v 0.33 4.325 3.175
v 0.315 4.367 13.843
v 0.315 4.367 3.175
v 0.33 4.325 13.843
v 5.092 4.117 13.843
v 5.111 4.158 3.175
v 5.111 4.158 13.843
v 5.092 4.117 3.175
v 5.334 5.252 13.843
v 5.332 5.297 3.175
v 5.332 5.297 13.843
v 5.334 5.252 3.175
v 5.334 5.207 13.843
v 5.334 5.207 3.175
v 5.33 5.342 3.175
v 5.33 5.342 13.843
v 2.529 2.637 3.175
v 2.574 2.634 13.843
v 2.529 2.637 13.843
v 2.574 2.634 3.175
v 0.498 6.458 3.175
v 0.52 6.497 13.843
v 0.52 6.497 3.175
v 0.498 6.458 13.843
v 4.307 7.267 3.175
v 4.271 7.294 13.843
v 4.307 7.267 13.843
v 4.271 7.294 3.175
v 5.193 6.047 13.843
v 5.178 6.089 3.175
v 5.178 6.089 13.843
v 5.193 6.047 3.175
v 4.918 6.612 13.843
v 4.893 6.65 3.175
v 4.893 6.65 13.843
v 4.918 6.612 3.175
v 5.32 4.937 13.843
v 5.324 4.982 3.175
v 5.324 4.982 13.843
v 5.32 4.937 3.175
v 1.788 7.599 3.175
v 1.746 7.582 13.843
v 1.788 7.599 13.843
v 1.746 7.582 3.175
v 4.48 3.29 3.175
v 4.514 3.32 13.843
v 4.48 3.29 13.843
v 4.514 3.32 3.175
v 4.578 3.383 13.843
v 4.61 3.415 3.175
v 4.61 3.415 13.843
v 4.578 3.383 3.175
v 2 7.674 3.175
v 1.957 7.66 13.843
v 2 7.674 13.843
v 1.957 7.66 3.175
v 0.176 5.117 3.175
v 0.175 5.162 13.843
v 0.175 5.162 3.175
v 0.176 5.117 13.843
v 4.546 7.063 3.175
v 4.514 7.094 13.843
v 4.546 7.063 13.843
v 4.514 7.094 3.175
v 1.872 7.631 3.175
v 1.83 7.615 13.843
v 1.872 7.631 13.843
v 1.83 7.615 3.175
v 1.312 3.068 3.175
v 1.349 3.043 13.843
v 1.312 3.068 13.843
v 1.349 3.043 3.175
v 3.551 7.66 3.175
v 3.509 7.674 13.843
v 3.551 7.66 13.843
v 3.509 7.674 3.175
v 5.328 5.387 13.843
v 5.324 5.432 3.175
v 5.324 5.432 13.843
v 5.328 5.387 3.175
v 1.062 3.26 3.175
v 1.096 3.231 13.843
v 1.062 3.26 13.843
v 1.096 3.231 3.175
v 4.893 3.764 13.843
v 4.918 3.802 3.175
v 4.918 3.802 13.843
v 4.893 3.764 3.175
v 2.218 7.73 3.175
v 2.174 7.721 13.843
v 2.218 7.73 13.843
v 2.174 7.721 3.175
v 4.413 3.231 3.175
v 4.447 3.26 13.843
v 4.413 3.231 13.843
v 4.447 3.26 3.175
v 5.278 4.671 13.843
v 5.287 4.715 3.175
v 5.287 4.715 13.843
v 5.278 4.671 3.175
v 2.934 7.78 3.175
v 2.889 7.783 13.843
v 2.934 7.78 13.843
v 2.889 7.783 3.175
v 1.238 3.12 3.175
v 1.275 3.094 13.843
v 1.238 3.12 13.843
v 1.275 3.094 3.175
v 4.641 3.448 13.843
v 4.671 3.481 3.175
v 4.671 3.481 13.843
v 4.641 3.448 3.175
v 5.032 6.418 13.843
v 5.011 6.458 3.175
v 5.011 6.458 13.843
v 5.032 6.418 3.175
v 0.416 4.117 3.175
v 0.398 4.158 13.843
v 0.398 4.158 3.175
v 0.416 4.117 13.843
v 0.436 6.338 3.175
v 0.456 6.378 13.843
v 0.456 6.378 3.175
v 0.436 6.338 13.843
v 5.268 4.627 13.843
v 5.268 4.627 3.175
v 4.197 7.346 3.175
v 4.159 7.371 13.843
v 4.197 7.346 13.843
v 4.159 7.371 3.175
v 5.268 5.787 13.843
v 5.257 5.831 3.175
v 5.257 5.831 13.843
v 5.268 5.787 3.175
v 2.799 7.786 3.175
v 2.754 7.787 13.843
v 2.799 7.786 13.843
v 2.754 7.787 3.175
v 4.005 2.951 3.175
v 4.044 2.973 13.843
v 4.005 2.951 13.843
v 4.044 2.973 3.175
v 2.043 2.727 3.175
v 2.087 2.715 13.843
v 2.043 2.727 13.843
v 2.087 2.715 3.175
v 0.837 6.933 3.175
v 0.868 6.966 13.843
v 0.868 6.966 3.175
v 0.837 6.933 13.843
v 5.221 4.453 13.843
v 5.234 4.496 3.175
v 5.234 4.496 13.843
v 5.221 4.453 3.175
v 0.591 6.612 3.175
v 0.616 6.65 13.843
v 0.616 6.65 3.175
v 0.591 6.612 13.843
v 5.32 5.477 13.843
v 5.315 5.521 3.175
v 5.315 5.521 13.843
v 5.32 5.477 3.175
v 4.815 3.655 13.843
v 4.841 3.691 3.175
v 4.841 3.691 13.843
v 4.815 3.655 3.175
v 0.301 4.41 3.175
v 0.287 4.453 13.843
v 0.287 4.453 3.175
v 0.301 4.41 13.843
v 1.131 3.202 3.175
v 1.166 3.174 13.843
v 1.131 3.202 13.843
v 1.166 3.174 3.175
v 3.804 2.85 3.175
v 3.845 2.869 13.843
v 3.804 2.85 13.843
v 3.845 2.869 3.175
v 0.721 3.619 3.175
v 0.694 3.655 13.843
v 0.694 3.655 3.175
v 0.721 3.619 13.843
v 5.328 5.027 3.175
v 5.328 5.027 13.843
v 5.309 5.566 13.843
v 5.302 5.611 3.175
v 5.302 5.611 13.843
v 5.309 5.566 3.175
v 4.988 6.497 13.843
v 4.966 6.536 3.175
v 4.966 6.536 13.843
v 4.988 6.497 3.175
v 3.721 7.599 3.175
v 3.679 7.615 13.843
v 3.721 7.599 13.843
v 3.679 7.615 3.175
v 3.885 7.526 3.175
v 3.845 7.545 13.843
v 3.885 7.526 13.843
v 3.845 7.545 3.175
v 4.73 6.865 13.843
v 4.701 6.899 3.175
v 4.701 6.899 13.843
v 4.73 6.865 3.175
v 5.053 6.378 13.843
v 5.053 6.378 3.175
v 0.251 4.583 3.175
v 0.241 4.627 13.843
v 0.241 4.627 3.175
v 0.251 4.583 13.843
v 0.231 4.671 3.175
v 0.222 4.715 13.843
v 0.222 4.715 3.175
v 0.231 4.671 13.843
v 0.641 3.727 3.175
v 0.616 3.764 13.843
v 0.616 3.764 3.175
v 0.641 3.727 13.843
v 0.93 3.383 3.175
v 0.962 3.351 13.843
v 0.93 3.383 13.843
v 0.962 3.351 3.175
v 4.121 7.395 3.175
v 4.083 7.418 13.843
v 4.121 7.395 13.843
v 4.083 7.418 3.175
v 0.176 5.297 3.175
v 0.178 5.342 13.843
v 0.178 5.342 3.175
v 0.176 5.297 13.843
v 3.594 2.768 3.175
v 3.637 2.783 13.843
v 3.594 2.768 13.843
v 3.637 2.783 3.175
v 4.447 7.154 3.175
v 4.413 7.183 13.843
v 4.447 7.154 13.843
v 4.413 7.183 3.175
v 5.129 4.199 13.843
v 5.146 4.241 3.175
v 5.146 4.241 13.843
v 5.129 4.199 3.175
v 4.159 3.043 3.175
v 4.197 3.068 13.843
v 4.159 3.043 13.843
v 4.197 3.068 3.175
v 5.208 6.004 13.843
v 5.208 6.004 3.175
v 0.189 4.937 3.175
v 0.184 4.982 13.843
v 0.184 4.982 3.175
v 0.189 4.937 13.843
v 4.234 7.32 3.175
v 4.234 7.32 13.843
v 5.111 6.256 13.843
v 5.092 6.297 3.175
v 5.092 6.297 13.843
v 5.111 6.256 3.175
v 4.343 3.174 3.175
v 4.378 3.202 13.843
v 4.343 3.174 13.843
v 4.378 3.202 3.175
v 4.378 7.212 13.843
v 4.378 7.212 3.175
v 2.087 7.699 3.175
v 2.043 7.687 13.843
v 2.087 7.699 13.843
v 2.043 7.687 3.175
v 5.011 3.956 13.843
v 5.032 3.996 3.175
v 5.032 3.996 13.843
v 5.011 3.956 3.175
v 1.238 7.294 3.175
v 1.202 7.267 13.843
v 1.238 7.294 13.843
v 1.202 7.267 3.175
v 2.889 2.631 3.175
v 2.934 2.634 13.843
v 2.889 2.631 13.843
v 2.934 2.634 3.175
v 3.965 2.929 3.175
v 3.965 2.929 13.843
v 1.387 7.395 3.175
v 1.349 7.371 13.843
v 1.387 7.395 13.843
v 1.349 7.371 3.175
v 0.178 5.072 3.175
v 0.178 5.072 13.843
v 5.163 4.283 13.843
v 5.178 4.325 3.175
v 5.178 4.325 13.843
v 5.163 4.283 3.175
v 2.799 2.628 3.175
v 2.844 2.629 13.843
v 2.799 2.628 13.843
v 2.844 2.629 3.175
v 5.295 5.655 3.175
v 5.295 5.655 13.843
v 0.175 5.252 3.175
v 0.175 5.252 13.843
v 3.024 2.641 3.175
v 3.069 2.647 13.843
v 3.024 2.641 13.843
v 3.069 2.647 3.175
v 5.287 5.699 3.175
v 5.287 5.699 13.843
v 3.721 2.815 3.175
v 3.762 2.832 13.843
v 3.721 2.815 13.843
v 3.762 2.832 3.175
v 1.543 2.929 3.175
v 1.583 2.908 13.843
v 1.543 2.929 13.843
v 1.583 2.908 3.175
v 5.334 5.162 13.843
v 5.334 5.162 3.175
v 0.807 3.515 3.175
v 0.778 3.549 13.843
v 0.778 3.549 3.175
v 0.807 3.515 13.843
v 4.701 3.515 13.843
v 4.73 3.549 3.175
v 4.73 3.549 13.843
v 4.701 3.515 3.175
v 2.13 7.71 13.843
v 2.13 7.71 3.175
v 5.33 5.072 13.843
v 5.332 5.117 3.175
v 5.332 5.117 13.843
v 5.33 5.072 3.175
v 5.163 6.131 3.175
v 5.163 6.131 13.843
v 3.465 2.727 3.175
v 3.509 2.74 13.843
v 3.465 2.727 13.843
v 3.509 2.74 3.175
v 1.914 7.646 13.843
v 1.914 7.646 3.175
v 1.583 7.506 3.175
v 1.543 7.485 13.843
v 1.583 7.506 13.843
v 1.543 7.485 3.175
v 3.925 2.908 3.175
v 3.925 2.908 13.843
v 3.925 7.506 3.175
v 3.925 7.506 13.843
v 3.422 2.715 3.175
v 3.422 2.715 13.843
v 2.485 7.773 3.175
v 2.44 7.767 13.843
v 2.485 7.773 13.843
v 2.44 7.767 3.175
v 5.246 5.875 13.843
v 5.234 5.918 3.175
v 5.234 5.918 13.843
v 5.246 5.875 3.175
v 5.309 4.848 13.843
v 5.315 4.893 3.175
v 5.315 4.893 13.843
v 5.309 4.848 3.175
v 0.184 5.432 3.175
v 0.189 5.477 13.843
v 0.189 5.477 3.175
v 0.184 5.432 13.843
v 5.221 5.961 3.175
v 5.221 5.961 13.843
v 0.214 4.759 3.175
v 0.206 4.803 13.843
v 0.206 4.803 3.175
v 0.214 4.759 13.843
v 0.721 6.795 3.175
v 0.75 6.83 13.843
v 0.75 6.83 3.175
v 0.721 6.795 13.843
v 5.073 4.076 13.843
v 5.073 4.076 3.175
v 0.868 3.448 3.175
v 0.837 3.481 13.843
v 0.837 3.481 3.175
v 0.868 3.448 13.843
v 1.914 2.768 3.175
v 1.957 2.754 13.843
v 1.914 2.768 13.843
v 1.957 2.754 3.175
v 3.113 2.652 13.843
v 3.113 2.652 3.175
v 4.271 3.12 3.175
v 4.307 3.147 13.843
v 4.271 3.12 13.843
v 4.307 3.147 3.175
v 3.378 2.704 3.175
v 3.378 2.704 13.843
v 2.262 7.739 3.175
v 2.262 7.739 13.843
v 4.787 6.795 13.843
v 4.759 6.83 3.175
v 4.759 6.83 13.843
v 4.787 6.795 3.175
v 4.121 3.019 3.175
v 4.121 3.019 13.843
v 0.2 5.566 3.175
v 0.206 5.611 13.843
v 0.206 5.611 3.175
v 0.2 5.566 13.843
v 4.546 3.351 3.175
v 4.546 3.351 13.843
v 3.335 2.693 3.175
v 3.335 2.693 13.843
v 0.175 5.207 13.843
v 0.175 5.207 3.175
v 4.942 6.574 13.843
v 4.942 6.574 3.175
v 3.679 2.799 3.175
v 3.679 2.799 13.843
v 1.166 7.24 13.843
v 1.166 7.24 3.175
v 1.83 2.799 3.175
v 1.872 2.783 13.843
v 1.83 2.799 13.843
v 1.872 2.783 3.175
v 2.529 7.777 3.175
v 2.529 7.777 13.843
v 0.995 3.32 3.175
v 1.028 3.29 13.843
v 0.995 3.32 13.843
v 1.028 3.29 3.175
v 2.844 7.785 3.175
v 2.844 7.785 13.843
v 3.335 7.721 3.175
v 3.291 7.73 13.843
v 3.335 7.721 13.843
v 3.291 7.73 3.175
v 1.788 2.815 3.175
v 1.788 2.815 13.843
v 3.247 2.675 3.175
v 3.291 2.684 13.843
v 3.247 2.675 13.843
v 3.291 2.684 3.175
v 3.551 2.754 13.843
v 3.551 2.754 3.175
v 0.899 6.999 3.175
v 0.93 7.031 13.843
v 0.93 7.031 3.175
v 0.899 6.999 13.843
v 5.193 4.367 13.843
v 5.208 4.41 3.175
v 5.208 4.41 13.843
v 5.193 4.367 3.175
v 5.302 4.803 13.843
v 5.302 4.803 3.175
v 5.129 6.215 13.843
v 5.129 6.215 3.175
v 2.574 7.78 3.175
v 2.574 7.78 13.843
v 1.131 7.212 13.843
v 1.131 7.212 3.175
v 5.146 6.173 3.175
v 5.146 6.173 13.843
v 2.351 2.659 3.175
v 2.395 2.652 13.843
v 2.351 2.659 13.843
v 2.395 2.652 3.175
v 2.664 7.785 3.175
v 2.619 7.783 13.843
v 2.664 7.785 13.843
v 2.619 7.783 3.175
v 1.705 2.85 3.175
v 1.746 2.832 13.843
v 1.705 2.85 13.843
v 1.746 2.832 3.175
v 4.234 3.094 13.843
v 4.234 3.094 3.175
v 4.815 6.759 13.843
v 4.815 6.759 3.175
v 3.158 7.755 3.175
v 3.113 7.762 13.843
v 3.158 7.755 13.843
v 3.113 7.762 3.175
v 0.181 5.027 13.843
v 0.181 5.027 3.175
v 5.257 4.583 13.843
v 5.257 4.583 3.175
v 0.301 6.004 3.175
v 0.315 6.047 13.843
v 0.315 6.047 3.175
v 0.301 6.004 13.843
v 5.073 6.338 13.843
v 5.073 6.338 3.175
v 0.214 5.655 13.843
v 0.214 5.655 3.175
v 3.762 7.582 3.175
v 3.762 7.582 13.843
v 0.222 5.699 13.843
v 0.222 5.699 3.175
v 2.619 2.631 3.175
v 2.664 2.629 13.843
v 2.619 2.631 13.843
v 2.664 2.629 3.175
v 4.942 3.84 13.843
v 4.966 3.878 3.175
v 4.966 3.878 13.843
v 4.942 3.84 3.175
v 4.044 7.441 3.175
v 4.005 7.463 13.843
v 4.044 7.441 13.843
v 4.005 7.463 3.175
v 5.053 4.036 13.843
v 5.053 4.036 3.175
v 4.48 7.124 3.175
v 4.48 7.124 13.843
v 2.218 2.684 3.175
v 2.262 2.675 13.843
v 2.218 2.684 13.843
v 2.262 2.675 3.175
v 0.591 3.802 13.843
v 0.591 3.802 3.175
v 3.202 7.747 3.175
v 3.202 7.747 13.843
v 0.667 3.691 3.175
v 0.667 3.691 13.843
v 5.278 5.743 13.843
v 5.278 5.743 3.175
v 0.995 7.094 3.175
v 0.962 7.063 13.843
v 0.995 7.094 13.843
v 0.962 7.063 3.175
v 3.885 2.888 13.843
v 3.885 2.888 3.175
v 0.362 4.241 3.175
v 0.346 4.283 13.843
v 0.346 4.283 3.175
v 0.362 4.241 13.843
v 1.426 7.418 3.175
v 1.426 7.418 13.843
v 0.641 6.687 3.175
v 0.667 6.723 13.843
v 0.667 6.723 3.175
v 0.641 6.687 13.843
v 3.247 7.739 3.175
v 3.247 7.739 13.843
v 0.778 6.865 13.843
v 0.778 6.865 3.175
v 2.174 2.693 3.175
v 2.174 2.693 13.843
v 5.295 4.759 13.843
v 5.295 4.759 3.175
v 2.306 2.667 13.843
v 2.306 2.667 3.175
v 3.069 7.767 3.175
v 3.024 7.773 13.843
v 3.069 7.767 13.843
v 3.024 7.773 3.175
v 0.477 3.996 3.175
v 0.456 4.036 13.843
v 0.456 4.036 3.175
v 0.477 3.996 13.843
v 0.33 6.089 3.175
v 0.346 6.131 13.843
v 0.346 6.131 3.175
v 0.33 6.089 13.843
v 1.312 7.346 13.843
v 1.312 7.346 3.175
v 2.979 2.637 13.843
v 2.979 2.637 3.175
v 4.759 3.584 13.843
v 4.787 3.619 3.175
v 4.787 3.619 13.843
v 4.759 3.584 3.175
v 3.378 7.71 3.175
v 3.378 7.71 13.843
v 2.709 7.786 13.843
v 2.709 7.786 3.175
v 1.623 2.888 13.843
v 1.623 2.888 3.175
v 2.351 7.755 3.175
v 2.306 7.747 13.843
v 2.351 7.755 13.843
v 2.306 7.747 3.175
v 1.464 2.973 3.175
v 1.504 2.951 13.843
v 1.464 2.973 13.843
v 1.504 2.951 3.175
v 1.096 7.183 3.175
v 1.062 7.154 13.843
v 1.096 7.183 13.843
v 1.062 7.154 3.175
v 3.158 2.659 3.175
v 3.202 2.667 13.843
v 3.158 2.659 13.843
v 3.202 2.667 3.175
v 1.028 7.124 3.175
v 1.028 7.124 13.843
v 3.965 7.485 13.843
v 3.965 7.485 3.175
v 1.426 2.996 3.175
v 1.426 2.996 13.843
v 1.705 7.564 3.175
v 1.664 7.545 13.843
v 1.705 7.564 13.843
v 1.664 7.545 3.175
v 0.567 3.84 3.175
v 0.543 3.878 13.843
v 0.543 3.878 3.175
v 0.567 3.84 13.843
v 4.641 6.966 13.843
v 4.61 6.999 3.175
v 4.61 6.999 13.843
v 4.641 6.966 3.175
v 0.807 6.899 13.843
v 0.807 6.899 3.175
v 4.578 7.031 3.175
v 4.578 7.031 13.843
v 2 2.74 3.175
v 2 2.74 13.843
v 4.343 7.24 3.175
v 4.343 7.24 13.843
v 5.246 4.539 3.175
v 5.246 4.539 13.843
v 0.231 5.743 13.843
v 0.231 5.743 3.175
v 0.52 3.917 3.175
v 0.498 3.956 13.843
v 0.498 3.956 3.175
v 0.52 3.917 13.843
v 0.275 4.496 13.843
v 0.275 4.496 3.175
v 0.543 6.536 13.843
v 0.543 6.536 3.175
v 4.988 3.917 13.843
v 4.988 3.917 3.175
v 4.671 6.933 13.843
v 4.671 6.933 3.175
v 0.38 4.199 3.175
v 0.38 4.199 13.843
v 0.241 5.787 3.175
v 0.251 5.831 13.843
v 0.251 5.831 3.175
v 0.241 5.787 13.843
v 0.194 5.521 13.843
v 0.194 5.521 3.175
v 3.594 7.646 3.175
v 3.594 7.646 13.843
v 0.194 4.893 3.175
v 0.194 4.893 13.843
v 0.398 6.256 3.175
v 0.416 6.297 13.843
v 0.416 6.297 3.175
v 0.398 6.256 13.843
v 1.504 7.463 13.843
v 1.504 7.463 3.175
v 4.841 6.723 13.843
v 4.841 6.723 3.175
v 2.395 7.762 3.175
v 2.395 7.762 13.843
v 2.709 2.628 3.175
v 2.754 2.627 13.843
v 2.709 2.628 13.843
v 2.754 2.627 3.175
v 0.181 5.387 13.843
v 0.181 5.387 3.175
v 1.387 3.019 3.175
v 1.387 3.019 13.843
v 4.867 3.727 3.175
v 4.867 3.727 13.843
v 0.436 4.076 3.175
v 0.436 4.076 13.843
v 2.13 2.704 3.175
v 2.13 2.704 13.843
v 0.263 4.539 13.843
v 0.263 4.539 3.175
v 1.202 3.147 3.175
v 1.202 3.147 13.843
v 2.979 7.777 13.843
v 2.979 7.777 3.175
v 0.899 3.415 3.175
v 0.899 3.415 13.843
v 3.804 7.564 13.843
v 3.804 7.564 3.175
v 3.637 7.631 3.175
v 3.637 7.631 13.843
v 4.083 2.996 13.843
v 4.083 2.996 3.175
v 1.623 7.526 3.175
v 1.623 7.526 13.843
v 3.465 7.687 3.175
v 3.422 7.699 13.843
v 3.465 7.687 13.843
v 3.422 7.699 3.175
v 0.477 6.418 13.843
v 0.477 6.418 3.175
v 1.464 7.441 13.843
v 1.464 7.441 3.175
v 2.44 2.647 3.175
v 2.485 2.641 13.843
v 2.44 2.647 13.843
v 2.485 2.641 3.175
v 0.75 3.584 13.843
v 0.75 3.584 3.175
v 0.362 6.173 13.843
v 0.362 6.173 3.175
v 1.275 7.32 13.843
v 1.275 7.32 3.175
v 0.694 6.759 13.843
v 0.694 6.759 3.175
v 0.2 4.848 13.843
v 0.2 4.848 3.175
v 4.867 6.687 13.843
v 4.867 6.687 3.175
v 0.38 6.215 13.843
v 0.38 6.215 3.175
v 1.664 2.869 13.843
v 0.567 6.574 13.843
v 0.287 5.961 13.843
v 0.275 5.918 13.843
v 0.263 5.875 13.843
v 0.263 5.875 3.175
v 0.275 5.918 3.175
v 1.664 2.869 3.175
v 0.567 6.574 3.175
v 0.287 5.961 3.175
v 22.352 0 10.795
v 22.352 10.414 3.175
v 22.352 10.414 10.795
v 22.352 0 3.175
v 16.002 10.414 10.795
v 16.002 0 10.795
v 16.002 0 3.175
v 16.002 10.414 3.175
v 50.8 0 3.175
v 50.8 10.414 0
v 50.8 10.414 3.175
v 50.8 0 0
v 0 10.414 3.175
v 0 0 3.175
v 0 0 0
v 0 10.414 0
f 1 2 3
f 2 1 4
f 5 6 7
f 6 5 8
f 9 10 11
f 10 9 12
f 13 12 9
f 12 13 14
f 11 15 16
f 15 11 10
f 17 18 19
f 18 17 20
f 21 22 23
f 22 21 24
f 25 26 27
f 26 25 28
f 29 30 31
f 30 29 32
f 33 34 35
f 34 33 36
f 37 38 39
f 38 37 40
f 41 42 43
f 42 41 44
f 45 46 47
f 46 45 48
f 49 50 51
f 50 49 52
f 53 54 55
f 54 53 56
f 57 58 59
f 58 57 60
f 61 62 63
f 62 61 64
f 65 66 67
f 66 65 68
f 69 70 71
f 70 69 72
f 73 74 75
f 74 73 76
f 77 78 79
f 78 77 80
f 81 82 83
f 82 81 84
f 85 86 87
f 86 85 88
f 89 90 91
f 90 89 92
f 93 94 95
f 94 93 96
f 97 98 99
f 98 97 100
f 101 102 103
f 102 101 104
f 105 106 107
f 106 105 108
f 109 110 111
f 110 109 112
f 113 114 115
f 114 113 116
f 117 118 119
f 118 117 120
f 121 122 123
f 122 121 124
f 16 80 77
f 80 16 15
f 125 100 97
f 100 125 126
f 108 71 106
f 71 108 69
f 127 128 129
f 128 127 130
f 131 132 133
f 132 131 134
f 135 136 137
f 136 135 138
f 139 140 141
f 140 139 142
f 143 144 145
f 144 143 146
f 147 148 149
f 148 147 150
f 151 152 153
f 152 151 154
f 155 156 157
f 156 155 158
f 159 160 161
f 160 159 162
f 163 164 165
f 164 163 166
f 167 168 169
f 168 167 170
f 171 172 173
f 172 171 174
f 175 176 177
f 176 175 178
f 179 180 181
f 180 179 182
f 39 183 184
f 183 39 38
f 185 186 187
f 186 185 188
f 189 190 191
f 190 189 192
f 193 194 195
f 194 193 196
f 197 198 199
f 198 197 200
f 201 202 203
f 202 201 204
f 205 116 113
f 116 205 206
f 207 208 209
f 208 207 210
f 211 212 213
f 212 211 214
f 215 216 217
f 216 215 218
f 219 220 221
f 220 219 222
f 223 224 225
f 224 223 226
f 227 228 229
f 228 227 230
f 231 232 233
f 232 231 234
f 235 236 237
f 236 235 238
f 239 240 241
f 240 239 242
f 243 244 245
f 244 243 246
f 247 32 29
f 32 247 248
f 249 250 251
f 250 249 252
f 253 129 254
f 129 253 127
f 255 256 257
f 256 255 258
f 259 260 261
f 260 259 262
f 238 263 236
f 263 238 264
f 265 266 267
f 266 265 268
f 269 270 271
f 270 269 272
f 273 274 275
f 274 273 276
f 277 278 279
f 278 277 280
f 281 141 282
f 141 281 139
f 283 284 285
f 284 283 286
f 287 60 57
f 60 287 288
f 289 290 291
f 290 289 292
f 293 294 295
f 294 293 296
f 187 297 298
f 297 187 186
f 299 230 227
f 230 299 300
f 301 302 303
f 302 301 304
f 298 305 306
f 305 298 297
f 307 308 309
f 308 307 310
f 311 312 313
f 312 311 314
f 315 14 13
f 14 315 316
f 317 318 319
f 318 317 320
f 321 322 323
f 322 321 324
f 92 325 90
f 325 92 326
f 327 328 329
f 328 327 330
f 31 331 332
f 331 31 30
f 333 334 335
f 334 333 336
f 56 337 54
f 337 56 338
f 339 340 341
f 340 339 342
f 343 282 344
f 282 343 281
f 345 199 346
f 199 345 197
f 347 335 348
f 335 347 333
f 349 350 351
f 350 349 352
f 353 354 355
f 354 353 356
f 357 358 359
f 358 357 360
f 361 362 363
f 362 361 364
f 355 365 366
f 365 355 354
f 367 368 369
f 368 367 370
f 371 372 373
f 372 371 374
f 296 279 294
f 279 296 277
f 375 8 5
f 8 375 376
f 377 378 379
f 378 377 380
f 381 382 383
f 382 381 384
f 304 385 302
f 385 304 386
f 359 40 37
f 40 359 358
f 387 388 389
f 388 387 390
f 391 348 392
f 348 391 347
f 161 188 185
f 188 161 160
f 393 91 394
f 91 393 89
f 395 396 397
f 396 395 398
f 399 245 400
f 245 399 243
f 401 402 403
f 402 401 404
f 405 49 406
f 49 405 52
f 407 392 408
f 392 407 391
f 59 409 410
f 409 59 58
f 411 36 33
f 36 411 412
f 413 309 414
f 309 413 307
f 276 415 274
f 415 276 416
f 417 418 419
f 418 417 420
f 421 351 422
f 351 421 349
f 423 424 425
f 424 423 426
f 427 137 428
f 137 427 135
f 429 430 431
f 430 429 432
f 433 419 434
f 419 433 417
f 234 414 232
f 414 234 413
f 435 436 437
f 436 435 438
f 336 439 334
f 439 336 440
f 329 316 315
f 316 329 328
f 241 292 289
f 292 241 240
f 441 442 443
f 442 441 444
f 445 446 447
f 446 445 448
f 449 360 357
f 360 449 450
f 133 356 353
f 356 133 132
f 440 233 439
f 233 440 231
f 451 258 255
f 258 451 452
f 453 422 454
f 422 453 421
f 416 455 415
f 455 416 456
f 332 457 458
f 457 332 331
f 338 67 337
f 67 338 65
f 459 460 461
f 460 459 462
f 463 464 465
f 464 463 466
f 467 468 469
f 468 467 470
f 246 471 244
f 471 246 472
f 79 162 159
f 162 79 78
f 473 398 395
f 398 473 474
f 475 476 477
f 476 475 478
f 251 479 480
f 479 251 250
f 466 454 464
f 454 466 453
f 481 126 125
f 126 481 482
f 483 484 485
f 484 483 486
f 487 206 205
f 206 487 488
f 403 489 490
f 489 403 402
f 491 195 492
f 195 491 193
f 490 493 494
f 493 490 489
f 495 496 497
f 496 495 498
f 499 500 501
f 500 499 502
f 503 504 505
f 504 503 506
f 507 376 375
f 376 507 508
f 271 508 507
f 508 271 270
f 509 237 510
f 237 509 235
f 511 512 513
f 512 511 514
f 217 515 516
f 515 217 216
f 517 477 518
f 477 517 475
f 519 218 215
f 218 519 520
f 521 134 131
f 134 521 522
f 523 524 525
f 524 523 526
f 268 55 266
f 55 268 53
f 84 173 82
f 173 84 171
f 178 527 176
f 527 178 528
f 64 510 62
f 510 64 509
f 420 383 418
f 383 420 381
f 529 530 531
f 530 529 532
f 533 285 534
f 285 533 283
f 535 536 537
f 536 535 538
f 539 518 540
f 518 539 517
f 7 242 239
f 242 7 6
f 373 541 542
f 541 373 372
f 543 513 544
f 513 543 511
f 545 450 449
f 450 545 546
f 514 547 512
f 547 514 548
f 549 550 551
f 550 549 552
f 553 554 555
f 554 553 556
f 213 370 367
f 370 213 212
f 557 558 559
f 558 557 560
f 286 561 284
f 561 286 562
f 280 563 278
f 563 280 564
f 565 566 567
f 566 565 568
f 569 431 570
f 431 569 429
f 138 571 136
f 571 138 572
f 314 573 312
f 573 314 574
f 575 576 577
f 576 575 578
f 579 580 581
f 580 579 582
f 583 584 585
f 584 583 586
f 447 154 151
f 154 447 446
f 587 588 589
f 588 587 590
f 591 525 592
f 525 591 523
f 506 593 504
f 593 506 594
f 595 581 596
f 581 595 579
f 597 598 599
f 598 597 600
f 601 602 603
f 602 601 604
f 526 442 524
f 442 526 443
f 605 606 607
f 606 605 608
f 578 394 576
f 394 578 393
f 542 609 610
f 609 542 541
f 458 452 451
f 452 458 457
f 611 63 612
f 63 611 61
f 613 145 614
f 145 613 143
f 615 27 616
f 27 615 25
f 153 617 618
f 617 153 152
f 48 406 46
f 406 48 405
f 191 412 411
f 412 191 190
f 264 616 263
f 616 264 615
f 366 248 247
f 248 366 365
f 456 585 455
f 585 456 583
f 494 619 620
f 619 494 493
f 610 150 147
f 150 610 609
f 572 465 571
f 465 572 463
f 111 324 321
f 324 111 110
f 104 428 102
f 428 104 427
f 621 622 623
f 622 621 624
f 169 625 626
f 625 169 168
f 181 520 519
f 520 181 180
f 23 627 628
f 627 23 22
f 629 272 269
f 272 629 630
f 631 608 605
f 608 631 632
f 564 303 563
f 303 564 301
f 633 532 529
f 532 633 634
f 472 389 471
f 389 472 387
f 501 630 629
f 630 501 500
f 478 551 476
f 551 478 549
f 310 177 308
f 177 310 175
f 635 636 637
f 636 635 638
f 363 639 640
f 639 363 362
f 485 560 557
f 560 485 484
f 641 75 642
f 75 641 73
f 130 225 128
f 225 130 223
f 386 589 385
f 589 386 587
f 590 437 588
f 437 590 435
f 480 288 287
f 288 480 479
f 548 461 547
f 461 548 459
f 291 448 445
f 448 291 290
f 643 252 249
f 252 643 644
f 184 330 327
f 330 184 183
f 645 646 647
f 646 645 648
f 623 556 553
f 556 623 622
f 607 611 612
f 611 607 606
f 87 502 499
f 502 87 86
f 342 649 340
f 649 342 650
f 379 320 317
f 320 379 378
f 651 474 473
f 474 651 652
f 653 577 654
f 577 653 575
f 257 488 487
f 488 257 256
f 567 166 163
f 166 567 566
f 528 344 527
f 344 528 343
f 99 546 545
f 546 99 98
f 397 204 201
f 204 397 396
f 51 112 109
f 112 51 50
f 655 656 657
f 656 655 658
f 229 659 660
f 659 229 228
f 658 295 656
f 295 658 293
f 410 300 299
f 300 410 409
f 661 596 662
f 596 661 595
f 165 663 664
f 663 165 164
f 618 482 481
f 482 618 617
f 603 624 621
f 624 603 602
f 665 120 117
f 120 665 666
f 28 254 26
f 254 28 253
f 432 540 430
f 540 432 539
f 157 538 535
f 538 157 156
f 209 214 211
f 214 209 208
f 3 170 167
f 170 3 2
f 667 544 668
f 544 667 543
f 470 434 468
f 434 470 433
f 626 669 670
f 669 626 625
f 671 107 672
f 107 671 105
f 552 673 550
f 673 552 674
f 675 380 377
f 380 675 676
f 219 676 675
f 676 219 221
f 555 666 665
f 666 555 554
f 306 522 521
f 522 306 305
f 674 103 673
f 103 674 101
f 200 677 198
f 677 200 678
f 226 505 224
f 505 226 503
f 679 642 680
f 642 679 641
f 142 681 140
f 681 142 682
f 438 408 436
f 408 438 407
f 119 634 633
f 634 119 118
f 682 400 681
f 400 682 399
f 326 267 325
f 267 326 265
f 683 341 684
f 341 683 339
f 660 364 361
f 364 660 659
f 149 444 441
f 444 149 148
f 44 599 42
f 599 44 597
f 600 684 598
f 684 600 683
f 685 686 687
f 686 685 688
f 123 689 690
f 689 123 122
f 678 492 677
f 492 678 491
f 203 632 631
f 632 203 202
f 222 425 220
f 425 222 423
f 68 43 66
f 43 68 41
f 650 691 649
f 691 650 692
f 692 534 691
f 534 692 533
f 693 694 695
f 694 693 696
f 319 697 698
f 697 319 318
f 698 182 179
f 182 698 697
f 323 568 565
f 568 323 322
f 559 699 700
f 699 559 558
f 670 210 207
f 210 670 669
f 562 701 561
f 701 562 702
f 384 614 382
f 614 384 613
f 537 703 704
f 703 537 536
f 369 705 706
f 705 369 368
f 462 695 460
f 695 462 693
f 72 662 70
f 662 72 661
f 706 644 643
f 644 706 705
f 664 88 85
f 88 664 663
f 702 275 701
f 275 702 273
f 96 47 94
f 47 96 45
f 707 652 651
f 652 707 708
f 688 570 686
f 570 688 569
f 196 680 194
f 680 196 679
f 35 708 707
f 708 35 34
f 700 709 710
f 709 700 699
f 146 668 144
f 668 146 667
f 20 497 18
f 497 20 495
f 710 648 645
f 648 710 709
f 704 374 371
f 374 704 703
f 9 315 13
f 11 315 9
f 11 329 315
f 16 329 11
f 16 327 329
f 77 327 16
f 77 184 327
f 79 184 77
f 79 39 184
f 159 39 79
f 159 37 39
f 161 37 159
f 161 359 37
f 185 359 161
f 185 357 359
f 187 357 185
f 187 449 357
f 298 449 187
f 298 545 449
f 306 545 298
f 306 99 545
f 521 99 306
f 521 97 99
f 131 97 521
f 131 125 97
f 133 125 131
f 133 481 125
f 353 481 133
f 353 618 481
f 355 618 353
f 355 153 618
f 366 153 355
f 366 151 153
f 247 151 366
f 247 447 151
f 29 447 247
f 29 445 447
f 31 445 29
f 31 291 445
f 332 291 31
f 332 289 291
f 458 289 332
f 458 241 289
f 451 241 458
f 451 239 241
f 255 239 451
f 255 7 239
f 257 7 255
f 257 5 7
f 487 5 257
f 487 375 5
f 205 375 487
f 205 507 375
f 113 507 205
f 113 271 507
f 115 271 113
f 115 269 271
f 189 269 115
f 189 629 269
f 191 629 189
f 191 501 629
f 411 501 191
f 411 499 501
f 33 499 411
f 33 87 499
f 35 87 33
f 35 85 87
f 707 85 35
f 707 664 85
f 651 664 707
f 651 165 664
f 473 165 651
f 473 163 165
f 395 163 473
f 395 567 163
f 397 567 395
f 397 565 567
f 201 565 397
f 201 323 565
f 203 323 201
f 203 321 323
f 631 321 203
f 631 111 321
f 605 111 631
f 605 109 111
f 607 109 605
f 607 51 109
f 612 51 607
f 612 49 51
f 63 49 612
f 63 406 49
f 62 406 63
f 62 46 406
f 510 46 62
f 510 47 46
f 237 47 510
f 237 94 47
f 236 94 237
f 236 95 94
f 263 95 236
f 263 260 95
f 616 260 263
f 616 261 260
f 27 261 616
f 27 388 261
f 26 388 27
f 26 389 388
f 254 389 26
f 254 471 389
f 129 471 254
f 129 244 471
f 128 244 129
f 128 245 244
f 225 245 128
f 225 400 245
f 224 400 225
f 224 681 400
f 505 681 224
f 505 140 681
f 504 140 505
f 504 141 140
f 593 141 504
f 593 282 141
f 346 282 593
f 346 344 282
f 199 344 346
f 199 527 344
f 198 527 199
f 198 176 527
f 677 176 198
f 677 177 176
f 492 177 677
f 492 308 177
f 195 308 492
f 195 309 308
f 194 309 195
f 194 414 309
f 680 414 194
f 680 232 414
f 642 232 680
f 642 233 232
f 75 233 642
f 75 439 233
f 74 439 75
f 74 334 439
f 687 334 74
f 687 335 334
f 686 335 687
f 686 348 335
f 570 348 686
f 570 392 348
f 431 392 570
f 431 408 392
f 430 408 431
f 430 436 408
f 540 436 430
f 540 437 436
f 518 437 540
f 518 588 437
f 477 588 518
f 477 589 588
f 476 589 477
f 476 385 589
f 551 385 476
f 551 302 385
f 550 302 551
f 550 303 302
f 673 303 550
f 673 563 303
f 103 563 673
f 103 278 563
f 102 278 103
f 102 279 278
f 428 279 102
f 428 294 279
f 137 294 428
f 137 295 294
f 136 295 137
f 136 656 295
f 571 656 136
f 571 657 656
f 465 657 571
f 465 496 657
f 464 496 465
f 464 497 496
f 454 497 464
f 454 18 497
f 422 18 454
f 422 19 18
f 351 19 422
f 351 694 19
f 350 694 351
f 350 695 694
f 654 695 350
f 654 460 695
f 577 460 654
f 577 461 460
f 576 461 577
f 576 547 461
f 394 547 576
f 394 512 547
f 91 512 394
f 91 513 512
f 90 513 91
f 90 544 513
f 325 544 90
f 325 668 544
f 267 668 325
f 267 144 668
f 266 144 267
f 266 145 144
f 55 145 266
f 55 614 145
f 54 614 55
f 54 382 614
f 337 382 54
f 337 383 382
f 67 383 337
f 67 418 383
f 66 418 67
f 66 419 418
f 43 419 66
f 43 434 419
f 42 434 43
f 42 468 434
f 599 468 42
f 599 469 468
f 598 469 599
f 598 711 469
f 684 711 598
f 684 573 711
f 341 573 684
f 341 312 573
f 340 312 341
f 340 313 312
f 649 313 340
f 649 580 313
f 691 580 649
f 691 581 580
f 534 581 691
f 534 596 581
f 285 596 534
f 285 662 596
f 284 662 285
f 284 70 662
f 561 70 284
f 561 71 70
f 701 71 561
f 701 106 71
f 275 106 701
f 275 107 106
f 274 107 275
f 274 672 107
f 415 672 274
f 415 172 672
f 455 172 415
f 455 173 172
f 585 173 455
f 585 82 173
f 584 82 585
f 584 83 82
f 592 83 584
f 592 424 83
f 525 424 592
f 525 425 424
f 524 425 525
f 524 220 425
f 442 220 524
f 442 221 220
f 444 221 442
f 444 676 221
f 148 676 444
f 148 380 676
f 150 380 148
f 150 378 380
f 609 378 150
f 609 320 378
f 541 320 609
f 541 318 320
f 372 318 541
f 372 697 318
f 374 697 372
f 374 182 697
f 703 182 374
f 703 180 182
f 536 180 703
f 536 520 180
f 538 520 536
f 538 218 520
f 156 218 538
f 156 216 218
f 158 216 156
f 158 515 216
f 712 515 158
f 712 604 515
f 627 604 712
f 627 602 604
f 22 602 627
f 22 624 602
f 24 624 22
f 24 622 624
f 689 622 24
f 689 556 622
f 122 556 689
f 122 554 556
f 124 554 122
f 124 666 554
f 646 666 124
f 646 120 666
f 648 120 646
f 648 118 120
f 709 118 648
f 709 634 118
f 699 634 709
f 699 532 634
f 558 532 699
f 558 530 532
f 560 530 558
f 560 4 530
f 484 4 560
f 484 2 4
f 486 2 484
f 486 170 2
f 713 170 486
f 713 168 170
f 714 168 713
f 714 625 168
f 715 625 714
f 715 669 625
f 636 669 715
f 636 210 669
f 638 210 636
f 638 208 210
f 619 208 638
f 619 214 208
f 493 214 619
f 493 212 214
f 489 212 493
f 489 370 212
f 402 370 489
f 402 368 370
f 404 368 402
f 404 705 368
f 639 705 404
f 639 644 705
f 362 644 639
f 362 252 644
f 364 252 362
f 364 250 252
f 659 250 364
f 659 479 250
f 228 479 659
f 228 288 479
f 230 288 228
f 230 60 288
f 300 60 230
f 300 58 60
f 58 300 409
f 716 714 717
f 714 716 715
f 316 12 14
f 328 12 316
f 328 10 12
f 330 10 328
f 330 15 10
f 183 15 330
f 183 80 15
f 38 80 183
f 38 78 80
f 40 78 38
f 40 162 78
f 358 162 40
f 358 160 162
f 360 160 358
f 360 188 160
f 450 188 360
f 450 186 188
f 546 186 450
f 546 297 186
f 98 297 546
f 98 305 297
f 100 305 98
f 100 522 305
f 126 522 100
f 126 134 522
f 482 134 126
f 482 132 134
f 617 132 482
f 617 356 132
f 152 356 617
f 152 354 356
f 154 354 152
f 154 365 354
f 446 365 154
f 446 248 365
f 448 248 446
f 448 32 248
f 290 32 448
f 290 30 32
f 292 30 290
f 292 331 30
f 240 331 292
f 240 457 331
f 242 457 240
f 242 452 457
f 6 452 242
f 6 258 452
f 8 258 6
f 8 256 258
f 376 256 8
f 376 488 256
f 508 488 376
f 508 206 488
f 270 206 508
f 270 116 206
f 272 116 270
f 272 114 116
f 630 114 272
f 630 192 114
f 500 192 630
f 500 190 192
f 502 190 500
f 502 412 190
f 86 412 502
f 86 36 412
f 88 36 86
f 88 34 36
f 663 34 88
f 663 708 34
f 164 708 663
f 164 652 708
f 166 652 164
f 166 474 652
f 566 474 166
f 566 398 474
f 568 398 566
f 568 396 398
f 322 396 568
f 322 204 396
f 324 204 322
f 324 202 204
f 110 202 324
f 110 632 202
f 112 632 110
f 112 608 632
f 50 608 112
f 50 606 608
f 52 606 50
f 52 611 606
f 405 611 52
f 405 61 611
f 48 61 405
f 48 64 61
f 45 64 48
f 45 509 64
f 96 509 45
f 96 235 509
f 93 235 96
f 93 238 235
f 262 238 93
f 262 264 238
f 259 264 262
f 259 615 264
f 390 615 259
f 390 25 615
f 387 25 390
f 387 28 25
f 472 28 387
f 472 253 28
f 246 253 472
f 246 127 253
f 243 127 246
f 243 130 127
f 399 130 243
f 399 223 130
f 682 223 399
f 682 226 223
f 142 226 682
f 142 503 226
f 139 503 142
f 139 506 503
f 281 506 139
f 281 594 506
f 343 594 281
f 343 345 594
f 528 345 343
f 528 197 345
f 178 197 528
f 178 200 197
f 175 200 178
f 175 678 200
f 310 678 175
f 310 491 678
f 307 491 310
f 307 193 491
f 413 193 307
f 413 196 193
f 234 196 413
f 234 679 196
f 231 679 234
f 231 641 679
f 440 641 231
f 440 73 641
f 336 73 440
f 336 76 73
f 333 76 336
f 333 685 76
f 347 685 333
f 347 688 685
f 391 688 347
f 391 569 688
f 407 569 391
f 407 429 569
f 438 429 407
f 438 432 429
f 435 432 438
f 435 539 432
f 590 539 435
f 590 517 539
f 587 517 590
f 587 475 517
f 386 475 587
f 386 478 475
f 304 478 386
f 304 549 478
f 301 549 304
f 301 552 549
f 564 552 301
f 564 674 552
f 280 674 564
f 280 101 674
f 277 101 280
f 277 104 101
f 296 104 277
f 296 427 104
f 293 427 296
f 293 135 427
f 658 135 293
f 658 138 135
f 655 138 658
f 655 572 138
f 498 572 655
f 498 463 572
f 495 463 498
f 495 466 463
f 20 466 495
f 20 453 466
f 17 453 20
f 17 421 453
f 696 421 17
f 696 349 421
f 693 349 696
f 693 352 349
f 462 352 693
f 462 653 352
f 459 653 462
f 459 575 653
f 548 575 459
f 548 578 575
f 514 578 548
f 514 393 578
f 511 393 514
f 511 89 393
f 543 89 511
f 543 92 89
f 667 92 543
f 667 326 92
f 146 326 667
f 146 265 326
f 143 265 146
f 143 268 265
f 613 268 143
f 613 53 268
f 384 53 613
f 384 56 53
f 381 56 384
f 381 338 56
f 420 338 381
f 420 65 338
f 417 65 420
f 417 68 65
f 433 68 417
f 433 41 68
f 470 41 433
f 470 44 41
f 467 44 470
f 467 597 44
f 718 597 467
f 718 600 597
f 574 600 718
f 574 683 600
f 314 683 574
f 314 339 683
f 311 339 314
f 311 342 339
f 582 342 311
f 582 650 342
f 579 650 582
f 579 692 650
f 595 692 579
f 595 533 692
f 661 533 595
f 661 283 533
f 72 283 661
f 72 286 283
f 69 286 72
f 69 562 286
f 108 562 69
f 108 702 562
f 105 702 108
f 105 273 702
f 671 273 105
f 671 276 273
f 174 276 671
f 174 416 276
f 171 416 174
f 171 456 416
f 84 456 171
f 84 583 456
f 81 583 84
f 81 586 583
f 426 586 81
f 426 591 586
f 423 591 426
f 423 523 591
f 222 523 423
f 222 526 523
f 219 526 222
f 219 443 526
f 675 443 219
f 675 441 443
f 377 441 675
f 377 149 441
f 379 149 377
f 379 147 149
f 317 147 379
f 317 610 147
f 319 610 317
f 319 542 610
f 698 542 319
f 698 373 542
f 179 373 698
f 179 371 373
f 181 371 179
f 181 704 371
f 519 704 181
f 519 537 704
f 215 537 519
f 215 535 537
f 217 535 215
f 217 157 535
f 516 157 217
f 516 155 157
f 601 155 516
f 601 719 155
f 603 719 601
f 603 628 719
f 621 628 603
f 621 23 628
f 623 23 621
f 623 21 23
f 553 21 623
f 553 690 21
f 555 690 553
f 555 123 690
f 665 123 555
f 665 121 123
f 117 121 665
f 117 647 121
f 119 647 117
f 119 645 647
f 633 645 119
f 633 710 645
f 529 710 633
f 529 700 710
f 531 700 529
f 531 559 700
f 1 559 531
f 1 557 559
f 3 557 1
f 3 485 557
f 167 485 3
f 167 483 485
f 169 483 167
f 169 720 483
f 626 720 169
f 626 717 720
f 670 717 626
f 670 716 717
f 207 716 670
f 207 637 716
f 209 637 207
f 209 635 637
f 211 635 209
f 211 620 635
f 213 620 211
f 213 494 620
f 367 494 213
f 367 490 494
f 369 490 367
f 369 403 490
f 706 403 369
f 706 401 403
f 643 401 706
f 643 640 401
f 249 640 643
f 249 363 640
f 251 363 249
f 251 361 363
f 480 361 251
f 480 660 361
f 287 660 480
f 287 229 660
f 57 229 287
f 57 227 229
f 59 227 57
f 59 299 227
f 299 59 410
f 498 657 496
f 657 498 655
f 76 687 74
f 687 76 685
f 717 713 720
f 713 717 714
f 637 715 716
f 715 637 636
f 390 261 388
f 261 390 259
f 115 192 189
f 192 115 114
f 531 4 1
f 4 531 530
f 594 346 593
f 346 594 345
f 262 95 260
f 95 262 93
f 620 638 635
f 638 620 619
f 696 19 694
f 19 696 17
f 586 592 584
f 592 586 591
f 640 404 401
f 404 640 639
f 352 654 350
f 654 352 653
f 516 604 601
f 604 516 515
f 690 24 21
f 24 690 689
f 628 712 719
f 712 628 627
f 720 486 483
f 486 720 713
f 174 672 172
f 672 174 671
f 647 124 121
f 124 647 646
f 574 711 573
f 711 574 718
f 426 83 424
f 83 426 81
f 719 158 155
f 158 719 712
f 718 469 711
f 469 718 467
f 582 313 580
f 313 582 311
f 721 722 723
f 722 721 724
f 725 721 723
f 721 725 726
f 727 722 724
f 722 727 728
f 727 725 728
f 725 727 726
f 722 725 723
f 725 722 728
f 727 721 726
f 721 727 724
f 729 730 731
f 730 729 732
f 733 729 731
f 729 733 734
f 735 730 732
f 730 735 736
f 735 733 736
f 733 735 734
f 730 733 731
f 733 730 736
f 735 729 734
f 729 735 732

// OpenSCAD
// file: config.scad
// 3D printers are metric, but I'm working in inches here...
function inch(n) = 25.4 * n; // convert inches to mm

/*
 * BEGIN CONFIGURATION
 */

stop_bump_height = inch(0.25);

tape_slot_length = inch(0.09);
tape_slot_width = inch(1.15);
slot_tape_width = inch(1.15);

tape_post_height = inch(0.3);
tape_post_width = inch(0.41);
tape_post_length = inch(0.25);
tape_post_x_start = inch(0.63);
tape_post_cylinder_dia = inch(0.203125);
tape_post_cylinder_height = inch(0.42);
tape_post_cyl_to_block = inch(0.42);
post_tape_width = inch(0.75);
tape_post_to_slot_gap = inch(0.2);
tape_post_inset = (post_tape_width - tape_post_width) / 2;

// plate - the base of the whole thing
plate_thickness = inch(0.25);
plate_length = inch(8);
plate_width = tape_slot_width + (tape_post_width * 2) + (tape_post_to_slot_gap * 2) + (tape_post_inset * 2);
plate_tab_overhang = inch(0.5);
hinge_tab_width = plate_width / 5;
hinge_gap = 0.05;

// arm - the part that folds out 90°
arm_thickness = plate_thickness;
arm_width = plate_width;
arm_length = inch(3.5);

/*
 * END CONFIGURATION
 */

// Calculated values
// main file
include <config.scad>
$fn = 360;

module tape_post_assy() {
    translate([tape_post_x_start - (tape_post_cyl_to_block + (tape_post_cylinder_dia / 2)), tape_post_width / 2, 0]) {
        cylinder(d=tape_post_cylinder_dia, h=tape_post_cylinder_height);
    }
    translate([tape_post_x_start, 0, 0]) {
        cube([tape_post_length, tape_post_width, tape_post_height]);
    }
}

// base block
cube([inch(2), tape_post_width, inch(0.125)]);
translate([0, 0, inch(0.125)]) {
    tape_post_assy();
}
